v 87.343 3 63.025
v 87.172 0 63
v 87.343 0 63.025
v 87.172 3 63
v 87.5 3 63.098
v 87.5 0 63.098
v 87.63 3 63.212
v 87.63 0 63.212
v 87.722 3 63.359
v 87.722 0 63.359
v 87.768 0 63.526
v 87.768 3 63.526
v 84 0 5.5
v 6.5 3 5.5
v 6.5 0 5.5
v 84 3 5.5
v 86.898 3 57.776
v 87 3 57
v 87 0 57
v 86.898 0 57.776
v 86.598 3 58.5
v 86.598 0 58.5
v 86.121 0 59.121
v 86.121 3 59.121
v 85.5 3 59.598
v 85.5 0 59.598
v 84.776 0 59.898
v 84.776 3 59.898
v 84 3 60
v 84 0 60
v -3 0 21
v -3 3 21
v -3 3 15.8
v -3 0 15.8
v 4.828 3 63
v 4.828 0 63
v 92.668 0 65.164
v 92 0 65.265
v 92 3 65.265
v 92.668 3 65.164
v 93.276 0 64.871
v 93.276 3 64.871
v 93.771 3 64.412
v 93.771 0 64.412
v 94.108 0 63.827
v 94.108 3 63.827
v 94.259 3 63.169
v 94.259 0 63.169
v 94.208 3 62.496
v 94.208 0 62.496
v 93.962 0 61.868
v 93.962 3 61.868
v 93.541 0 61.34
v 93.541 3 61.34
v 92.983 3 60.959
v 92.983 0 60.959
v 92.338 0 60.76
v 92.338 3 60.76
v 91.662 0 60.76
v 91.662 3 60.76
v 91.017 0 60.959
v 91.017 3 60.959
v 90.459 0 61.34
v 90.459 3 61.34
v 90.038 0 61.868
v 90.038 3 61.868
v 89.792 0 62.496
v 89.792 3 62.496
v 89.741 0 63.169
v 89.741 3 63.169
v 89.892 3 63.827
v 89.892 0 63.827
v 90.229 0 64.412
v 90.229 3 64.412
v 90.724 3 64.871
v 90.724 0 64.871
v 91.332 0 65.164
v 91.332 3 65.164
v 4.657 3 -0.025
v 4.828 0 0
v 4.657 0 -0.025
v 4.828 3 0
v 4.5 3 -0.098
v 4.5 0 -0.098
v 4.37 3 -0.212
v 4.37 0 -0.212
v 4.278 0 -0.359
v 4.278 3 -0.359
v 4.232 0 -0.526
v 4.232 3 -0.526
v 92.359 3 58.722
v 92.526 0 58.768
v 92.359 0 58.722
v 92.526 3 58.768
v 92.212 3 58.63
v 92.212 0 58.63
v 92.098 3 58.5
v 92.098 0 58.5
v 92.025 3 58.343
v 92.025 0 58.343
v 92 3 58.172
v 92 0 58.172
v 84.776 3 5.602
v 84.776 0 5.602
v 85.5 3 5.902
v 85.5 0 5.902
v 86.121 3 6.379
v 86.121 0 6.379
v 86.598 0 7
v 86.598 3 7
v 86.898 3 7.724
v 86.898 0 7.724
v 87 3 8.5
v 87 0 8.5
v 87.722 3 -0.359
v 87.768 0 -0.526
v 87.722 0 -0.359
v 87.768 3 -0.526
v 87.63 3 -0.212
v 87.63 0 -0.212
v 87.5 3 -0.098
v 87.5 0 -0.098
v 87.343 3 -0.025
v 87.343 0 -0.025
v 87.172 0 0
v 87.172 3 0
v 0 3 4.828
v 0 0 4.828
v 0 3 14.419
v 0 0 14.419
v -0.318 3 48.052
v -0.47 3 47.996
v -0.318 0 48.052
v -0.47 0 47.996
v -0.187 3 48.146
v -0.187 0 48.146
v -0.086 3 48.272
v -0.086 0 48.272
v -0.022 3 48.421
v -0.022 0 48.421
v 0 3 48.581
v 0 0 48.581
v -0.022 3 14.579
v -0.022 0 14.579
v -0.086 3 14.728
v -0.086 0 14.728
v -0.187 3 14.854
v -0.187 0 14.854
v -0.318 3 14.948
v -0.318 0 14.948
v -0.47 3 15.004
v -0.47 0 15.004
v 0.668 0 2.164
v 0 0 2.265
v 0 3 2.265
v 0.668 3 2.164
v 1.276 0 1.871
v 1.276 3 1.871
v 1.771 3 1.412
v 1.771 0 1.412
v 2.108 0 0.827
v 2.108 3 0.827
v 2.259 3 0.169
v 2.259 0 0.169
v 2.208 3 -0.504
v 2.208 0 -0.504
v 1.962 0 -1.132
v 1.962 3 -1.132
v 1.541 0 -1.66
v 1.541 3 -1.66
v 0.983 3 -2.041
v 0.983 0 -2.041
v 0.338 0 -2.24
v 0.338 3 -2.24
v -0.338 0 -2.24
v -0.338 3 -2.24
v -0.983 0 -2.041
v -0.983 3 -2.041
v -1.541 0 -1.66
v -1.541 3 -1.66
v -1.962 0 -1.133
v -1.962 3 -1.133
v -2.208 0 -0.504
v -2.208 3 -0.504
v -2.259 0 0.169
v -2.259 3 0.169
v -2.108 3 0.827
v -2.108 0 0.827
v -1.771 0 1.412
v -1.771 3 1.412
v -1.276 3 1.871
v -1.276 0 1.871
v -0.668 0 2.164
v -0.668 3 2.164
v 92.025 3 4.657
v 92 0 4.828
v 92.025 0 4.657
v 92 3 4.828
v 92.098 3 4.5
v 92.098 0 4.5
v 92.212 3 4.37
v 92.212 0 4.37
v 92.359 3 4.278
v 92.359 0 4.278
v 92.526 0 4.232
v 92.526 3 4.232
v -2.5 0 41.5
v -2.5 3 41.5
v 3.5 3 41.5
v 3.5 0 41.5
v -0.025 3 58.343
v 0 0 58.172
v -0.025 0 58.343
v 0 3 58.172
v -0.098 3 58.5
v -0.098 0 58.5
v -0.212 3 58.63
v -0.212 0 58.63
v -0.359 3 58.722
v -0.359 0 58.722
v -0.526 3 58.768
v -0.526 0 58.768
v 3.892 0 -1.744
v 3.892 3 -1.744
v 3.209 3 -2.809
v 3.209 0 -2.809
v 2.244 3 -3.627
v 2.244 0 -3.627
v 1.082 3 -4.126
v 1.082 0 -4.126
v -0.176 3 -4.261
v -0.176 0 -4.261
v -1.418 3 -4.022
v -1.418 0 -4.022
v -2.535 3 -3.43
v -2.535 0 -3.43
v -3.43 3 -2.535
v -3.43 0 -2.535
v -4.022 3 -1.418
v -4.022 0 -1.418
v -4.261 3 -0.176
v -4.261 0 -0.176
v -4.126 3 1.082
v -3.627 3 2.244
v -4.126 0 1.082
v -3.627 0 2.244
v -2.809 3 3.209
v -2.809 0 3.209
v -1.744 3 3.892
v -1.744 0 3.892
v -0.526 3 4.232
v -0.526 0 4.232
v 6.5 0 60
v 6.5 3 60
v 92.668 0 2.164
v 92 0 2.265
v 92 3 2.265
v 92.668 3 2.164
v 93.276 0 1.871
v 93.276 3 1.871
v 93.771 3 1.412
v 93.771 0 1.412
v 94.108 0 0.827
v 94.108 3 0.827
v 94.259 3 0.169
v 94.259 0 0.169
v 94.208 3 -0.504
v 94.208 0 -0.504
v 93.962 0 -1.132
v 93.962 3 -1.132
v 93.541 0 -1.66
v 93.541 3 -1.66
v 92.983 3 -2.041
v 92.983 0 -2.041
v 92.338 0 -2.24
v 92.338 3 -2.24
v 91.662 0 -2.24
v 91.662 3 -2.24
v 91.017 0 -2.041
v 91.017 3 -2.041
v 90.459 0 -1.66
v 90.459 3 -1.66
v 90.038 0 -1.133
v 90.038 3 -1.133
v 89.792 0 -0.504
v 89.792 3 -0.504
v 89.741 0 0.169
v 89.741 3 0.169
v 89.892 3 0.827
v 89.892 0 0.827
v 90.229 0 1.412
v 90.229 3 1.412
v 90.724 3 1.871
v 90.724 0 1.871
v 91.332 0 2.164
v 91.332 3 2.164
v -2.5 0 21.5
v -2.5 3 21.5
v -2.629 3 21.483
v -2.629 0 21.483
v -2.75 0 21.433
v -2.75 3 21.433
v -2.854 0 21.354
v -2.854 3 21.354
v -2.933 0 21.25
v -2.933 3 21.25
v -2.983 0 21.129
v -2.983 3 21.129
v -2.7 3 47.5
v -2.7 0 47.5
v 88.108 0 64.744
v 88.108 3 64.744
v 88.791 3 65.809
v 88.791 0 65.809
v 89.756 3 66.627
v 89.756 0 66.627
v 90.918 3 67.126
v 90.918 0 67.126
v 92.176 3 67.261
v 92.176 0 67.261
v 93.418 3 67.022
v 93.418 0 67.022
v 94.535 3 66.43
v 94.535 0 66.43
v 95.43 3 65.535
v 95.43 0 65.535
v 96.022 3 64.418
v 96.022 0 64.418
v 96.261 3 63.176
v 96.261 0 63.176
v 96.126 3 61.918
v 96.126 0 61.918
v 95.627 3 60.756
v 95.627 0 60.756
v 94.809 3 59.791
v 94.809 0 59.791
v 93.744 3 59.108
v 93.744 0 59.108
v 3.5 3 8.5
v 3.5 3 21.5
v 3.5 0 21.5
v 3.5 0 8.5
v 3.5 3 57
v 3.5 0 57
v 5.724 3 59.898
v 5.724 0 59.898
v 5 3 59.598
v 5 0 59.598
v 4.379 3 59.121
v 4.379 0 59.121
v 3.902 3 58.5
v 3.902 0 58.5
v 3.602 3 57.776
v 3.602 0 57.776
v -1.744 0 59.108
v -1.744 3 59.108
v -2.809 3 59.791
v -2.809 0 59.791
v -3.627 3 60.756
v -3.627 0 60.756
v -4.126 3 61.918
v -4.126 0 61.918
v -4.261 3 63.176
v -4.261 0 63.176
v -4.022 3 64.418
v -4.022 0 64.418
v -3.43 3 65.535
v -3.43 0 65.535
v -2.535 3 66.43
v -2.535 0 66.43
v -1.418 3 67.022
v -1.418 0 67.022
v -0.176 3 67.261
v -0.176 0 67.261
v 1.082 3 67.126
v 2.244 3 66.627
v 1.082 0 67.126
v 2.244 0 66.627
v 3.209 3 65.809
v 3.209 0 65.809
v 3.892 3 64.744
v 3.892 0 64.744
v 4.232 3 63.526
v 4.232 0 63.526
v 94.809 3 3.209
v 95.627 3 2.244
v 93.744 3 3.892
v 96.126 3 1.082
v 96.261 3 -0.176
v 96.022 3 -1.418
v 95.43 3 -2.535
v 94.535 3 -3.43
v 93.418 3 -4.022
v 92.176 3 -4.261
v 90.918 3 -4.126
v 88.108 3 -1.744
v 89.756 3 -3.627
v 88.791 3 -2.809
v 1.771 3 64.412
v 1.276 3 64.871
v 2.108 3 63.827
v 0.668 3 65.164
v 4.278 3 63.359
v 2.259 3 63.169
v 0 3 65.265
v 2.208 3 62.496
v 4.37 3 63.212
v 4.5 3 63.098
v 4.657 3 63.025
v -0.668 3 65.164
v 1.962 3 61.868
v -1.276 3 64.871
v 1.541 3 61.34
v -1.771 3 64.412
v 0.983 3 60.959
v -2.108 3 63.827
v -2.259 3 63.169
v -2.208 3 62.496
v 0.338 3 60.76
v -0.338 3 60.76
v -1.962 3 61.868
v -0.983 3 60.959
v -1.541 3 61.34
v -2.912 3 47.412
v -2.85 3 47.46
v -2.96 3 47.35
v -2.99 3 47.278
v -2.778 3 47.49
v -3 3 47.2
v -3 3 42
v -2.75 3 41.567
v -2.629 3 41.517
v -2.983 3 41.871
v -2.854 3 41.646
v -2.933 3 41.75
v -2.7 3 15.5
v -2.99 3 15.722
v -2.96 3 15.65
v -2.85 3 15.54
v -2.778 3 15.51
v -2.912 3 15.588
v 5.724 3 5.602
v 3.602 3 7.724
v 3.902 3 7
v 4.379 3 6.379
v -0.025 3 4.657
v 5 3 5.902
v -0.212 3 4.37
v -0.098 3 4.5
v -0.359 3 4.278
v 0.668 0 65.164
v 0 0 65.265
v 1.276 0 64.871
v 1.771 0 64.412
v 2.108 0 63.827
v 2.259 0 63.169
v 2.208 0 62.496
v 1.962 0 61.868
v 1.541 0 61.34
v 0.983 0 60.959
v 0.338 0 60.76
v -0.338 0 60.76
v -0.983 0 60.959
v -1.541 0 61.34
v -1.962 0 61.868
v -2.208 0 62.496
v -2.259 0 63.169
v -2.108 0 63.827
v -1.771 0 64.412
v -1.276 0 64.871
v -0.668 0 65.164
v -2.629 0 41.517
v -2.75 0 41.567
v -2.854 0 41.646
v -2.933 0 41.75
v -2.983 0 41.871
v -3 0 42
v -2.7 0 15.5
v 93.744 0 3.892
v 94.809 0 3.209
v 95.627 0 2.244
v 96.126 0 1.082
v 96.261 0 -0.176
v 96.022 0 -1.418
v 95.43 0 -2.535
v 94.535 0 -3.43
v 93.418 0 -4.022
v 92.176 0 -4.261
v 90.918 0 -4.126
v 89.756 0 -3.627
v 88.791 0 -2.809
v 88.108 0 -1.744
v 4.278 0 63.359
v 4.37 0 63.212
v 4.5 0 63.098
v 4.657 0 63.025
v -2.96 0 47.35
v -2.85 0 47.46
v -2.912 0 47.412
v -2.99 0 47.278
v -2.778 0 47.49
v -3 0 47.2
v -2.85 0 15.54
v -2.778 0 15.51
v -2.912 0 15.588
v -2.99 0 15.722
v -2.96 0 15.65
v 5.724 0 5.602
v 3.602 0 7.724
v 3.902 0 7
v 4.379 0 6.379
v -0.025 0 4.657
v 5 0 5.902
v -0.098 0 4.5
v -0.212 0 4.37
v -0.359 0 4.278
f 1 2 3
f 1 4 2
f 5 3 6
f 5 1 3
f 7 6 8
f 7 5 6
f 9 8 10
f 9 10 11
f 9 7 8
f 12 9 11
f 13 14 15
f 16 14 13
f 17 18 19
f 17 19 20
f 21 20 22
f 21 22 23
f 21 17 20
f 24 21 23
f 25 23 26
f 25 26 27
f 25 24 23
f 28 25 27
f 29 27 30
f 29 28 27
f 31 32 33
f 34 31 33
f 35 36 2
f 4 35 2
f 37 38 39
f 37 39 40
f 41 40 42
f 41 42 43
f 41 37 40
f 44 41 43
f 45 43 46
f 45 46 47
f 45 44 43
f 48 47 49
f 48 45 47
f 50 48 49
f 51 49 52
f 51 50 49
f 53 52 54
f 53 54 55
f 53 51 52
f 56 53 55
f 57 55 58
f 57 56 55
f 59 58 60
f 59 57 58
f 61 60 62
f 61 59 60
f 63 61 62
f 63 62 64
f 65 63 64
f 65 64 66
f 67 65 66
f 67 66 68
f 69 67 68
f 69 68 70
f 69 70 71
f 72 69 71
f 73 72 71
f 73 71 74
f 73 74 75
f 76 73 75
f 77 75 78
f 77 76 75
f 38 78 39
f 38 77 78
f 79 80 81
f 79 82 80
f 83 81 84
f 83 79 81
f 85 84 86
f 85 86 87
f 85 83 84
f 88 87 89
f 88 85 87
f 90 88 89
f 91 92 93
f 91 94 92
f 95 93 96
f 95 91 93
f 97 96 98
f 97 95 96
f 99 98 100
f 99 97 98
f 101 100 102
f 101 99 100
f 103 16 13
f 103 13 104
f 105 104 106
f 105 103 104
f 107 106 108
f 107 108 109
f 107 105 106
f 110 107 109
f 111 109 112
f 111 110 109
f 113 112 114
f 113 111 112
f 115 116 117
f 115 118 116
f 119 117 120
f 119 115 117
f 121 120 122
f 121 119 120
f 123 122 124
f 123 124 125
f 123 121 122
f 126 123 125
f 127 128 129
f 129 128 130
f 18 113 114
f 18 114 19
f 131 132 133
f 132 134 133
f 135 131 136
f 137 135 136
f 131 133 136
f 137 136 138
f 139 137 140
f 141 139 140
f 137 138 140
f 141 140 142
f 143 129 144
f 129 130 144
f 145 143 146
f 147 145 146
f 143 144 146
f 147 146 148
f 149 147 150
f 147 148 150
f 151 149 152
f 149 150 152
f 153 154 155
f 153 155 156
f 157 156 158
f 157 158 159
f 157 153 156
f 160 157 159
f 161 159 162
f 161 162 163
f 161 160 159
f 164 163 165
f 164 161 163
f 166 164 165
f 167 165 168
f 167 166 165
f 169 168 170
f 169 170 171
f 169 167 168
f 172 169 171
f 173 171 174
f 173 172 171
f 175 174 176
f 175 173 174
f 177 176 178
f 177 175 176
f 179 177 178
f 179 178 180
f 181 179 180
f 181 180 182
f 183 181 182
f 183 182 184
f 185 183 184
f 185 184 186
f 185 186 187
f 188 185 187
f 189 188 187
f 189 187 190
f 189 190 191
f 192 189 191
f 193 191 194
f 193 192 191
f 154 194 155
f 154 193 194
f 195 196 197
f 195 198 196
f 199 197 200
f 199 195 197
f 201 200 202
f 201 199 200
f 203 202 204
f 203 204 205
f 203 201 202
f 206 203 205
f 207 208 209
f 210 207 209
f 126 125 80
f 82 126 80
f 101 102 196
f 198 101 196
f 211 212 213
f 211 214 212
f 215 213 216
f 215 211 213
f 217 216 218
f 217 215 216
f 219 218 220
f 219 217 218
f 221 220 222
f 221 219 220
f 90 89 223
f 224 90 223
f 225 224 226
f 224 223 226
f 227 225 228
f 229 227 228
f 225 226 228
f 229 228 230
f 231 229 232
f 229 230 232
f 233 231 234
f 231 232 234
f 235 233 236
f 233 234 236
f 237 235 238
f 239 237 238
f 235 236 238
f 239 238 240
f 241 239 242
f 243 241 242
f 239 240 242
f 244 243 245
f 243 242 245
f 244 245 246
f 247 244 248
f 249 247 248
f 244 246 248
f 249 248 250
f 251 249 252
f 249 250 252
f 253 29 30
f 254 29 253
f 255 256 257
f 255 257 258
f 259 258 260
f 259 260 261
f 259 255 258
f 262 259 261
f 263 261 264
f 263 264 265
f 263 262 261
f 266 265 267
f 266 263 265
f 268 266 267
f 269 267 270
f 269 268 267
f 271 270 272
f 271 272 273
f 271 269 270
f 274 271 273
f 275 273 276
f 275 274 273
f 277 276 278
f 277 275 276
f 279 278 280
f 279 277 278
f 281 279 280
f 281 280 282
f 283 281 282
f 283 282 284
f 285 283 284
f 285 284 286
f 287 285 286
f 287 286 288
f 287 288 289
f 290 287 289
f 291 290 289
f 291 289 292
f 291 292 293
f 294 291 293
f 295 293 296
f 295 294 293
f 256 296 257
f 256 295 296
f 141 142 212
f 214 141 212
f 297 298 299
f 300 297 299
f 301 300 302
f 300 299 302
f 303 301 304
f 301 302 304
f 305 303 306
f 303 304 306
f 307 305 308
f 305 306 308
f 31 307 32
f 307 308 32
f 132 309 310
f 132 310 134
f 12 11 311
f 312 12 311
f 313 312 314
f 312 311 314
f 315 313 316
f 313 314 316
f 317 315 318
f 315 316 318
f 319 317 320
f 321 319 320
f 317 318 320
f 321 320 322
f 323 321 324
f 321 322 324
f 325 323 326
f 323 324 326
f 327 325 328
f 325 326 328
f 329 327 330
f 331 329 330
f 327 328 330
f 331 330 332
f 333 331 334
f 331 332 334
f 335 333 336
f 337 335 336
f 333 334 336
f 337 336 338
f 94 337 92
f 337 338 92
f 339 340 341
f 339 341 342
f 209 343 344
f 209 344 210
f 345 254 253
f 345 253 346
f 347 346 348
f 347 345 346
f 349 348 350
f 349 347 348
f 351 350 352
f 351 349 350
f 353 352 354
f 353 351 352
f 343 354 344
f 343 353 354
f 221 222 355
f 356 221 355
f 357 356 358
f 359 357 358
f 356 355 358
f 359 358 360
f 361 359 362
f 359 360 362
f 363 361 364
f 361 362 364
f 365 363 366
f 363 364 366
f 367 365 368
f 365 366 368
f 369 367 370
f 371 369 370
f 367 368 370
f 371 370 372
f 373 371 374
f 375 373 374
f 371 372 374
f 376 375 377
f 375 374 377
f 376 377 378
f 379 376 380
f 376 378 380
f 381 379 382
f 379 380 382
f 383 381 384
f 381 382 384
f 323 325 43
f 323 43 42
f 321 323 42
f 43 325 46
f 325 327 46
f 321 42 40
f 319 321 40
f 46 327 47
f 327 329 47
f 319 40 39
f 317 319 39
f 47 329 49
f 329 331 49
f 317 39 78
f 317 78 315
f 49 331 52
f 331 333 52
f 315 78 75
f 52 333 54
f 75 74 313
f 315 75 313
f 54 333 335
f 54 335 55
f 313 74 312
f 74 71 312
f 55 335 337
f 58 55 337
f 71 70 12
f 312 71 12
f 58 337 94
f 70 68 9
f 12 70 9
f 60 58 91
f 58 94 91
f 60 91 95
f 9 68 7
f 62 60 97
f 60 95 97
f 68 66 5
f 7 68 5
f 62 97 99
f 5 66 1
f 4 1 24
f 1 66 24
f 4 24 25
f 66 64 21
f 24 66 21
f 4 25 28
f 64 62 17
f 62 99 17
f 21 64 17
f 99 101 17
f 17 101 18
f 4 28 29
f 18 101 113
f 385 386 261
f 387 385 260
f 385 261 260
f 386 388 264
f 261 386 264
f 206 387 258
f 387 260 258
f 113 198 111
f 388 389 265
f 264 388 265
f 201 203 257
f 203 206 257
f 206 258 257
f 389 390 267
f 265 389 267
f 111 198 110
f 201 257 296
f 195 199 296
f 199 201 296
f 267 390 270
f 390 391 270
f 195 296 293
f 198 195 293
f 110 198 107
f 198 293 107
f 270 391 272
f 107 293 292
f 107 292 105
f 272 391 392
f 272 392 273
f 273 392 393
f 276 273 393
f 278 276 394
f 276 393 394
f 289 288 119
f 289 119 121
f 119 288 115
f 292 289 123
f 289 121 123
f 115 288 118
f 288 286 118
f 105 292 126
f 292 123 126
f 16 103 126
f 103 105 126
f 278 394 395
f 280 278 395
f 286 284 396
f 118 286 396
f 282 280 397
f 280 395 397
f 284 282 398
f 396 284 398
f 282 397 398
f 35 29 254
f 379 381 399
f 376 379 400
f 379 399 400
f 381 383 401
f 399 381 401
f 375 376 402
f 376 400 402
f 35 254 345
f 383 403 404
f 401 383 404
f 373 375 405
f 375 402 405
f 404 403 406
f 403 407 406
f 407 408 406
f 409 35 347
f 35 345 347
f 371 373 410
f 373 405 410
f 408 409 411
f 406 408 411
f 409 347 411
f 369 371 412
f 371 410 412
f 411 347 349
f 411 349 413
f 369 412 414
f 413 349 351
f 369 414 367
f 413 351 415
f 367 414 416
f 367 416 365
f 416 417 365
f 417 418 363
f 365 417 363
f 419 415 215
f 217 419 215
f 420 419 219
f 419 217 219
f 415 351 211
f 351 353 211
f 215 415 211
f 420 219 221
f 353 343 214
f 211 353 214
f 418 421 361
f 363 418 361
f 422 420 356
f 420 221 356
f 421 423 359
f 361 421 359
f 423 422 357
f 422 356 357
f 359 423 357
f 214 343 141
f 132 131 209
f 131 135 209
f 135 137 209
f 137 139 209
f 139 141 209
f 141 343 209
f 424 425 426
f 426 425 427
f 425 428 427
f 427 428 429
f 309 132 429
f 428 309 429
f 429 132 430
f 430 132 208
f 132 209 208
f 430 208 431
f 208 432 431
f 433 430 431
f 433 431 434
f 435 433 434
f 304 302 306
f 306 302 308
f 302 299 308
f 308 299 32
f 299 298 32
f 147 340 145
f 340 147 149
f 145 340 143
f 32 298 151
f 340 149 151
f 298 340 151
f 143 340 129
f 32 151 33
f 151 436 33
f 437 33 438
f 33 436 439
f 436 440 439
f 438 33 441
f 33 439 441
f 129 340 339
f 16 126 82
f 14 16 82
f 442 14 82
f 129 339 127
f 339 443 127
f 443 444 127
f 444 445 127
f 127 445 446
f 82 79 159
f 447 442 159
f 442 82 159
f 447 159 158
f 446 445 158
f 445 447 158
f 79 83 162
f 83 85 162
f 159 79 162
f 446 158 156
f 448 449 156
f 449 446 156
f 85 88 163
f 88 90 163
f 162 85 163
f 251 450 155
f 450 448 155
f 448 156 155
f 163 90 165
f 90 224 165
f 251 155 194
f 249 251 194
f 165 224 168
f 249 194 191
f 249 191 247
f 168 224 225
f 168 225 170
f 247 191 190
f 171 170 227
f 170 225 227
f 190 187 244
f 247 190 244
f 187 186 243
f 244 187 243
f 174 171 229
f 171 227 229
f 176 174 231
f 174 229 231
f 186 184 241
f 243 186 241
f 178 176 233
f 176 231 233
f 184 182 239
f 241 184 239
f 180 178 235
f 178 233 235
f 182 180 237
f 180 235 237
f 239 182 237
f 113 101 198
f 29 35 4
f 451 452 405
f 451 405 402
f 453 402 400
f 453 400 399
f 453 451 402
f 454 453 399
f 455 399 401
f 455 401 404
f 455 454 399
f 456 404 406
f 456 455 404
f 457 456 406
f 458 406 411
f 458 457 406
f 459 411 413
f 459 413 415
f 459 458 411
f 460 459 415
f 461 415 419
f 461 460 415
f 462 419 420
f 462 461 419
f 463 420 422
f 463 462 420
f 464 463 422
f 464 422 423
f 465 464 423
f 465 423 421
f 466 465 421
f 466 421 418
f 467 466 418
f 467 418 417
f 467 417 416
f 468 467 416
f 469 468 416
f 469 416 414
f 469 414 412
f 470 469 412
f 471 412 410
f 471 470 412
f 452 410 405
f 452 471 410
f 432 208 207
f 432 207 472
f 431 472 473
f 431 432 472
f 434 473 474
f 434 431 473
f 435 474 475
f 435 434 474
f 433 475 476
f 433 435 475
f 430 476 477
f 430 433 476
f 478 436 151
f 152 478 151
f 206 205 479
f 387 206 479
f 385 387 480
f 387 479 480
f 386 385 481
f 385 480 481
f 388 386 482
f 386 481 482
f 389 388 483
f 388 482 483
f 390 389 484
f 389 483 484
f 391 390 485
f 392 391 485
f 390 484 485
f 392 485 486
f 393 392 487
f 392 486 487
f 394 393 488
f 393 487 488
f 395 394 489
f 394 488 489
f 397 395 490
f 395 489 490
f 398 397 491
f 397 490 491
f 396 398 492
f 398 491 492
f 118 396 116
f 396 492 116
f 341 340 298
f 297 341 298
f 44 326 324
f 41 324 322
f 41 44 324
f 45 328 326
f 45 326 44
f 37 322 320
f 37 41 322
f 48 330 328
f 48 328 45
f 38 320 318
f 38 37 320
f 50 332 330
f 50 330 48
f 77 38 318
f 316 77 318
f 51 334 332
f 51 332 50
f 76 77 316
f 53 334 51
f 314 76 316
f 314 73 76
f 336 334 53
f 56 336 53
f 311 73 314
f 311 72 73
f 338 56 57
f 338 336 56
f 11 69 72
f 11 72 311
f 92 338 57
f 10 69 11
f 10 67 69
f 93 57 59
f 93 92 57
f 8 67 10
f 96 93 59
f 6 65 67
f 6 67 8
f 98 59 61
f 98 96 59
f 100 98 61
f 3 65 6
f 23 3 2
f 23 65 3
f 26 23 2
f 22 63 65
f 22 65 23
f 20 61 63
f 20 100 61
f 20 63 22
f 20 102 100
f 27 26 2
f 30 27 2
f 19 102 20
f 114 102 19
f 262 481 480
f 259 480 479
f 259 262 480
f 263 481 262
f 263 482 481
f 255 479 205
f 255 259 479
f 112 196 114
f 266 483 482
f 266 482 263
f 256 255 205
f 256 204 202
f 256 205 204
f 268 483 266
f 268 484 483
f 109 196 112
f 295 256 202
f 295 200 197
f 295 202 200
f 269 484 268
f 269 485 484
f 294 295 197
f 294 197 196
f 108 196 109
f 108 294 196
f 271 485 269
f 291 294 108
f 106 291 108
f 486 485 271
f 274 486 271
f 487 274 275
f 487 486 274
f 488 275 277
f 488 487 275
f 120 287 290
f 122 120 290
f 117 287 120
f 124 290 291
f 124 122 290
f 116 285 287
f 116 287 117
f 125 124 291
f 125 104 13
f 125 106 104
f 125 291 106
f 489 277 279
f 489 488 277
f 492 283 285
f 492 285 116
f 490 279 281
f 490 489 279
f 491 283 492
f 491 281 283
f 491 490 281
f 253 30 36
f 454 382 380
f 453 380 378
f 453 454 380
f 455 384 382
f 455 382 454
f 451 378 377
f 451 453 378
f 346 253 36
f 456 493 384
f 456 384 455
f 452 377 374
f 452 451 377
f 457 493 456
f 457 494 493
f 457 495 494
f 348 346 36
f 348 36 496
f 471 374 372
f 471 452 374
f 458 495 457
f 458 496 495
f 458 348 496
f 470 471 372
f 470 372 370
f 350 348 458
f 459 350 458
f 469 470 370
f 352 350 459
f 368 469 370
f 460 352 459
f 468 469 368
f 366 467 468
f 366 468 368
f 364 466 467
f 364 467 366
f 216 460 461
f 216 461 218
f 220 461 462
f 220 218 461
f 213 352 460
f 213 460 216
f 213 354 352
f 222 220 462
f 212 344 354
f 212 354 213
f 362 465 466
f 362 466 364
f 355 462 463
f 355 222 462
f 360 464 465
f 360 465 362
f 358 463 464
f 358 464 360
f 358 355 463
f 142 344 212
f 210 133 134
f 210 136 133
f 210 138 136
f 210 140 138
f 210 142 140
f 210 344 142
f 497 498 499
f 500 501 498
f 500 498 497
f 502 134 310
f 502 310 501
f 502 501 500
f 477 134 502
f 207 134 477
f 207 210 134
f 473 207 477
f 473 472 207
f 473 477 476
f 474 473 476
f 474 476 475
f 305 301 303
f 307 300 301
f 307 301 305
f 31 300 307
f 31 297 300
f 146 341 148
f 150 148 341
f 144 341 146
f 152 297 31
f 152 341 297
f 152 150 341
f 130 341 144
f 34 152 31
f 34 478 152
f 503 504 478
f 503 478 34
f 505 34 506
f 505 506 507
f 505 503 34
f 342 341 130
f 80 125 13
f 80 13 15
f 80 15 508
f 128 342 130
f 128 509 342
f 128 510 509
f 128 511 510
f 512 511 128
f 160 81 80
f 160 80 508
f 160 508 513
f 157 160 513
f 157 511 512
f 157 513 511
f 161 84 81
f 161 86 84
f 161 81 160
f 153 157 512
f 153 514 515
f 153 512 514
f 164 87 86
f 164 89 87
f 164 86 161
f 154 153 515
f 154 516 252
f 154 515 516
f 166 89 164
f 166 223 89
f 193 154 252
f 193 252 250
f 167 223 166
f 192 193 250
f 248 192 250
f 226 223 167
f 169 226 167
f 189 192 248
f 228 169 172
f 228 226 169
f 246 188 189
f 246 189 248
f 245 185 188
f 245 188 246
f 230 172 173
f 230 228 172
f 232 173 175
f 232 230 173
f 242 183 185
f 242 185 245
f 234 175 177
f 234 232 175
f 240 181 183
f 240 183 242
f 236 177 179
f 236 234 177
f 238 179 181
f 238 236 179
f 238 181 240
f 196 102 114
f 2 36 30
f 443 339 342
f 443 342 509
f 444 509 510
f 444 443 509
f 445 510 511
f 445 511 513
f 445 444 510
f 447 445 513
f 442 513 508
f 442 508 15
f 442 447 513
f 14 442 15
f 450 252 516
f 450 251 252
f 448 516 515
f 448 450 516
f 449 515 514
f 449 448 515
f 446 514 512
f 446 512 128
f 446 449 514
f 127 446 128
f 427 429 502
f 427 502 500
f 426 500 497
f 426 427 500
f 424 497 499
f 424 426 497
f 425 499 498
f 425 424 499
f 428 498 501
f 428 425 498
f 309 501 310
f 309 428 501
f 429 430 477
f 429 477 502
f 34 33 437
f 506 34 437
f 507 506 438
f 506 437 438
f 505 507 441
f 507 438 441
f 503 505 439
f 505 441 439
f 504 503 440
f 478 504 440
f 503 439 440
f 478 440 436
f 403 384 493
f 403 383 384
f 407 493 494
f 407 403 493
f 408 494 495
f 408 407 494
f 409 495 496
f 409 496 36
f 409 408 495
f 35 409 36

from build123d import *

# Parameters (mm, degrees)
SKETCH3_R           = 2.265
BOSS_EXTRUDE2_DEPTH = 3
SKETCH4_W           = 6.5
SKETCH4_H           = 20
CUT_EXTRUDE1_DEPTH  = 3
BOSS_EXTRUDE3_DEPTH = 3
FILLET1_R           = 0.6
CUT_EXTRUDE2_DEPTH  = 3


with BuildPart() as part:
    # Sketch3 → Boss-Extrude2 (new body)
    with BuildSketch(Plane(origin=(0, 0, 0), x_dir=(1, 0, 0), z_dir=(0, 1, 0))):
        with BuildLine():
            Line((0, -4.265), (0, -58.735))
            ThreePointArc((0, -58.735), (-3.015810422, -66.015810422), (4.265, -63))
            Line((4.265, -63), (87.735, -63))
            ThreePointArc((87.735, -63), (95.015810422, -66.015810422), (92, -58.735))
            Line((92, -58.735), (92, -4.265))
            ThreePointArc((92, -4.265), (95.015810422, 3.015810422), (87.735, 0))
            Line((87.735, 0), (4.265, 0))
            ThreePointArc((4.265, 0), (-3.015810422, 3.015810422), (0, -4.265))
        make_face()
        with Locations(Location((0, 0, 0), (0, 0, 270))):
            Circle(SKETCH3_R, mode=Mode.SUBTRACT)
        with Locations(Location((92, 0, 0), (0, 0, 270))):
            Circle(SKETCH3_R, mode=Mode.SUBTRACT)
        with Locations(Location((92, -63, 0), (0, 0, 270))):
            Circle(SKETCH3_R, mode=Mode.SUBTRACT)
        with Locations(Location((0, -63, 0), (0, 0, 270))):
            Circle(SKETCH3_R, mode=Mode.SUBTRACT)
    extrude(amount=BOSS_EXTRUDE2_DEPTH)

    # Sketch4 → Cut-Extrude1 (cut)
    with BuildSketch(Plane(origin=(0, 3, 0), x_dir=(1, 0, 0), z_dir=(0, 1, 0))):
        with Locations((3.25, -31.5)):
            Rectangle(SKETCH4_W, SKETCH4_H)
    extrude(amount=-CUT_EXTRUDE1_DEPTH, mode=Mode.SUBTRACT)

    # Sketch5 → Boss-Extrude3 (add)
    with BuildSketch(Plane(origin=(0, 3, 0), x_dir=(1, 0, 0), z_dir=(0, 1, 0))):
        with BuildLine():
            Line((0, -21.5), (-2.5, -21.5))
            ThreePointArc((-2.5, -21.5), (-2.853553391, -21.353553391), (-3, -21))
            Line((-3, -21), (-3, -15.8))
            ThreePointArc((-3, -15.8), (-2.912132034, -15.587867966), (-2.7, -15.5))
            Line((-2.7, -15.5), (0, -14.9))
            Line((0, -14.9), (0, -21.5))
        make_face()
        with BuildLine():
            Line((-3, -42), (-3, -47.2))
            ThreePointArc((-3, -47.2), (-2.912132034, -47.412132034), (-2.7, -47.5))
            Line((-2.7, -47.5), (0, -48.1))
            Line((0, -48.1), (0, -41.5))
            Line((0, -41.5), (-2.5, -41.5))
            ThreePointArc((-2.5, -41.5), (-2.853553391, -41.646446609), (-3, -42))
        make_face()
    extrude(amount=-BOSS_EXTRUDE3_DEPTH)

    # Fillet1
    fillet1_edges = [part.edges().sort_by_distance(p)[0] for p in [
        (92, 1.5, 4.265),
        (92, 1.5, 58.735),
        (87.735, 1.5, 63),
        (4.265, 1.5, 63),
        (0, 1.5, 58.735),
        (0, 1.5, 4.265),
        (4.265, 1.5, 0),
        (87.735, 1.5, 0),
        (6.5, 1.5, 21.5),
        (6.5, 1.5, 41.5),
        (0, 1.5, 14.9),
        (0, 1.5, 48.1),
    ]]
    fillet(fillet1_edges, radius=FILLET1_R)

    # Sketch7 → Cut-Extrude2 (cut)
    with BuildSketch(Plane(origin=(0, 3, 0), x_dir=(1, 0, 0), z_dir=(0, 1, 0))):
        with BuildLine():
            Line((6.5, -5.5), (84, -5.5))
            ThreePointArc((84, -5.5), (86.121320344, -6.378679656), (87, -8.5))
            Line((87, -8.5), (87, -57))
            ThreePointArc((87, -57), (86.121320344, -59.121320344), (84, -60))
            Line((84, -60), (6.5, -60))
            ThreePointArc((6.5, -60), (4.378679656, -59.121320344), (3.5, -57))
            Line((3.5, -57), (3.5, -8.5))
            ThreePointArc((3.5, -8.5), (4.378679656, -6.378679656), (6.5, -5.5))
        make_face()
    extrude(amount=-CUT_EXTRUDE2_DEPTH, mode=Mode.SUBTRACT)


solid = part.part
